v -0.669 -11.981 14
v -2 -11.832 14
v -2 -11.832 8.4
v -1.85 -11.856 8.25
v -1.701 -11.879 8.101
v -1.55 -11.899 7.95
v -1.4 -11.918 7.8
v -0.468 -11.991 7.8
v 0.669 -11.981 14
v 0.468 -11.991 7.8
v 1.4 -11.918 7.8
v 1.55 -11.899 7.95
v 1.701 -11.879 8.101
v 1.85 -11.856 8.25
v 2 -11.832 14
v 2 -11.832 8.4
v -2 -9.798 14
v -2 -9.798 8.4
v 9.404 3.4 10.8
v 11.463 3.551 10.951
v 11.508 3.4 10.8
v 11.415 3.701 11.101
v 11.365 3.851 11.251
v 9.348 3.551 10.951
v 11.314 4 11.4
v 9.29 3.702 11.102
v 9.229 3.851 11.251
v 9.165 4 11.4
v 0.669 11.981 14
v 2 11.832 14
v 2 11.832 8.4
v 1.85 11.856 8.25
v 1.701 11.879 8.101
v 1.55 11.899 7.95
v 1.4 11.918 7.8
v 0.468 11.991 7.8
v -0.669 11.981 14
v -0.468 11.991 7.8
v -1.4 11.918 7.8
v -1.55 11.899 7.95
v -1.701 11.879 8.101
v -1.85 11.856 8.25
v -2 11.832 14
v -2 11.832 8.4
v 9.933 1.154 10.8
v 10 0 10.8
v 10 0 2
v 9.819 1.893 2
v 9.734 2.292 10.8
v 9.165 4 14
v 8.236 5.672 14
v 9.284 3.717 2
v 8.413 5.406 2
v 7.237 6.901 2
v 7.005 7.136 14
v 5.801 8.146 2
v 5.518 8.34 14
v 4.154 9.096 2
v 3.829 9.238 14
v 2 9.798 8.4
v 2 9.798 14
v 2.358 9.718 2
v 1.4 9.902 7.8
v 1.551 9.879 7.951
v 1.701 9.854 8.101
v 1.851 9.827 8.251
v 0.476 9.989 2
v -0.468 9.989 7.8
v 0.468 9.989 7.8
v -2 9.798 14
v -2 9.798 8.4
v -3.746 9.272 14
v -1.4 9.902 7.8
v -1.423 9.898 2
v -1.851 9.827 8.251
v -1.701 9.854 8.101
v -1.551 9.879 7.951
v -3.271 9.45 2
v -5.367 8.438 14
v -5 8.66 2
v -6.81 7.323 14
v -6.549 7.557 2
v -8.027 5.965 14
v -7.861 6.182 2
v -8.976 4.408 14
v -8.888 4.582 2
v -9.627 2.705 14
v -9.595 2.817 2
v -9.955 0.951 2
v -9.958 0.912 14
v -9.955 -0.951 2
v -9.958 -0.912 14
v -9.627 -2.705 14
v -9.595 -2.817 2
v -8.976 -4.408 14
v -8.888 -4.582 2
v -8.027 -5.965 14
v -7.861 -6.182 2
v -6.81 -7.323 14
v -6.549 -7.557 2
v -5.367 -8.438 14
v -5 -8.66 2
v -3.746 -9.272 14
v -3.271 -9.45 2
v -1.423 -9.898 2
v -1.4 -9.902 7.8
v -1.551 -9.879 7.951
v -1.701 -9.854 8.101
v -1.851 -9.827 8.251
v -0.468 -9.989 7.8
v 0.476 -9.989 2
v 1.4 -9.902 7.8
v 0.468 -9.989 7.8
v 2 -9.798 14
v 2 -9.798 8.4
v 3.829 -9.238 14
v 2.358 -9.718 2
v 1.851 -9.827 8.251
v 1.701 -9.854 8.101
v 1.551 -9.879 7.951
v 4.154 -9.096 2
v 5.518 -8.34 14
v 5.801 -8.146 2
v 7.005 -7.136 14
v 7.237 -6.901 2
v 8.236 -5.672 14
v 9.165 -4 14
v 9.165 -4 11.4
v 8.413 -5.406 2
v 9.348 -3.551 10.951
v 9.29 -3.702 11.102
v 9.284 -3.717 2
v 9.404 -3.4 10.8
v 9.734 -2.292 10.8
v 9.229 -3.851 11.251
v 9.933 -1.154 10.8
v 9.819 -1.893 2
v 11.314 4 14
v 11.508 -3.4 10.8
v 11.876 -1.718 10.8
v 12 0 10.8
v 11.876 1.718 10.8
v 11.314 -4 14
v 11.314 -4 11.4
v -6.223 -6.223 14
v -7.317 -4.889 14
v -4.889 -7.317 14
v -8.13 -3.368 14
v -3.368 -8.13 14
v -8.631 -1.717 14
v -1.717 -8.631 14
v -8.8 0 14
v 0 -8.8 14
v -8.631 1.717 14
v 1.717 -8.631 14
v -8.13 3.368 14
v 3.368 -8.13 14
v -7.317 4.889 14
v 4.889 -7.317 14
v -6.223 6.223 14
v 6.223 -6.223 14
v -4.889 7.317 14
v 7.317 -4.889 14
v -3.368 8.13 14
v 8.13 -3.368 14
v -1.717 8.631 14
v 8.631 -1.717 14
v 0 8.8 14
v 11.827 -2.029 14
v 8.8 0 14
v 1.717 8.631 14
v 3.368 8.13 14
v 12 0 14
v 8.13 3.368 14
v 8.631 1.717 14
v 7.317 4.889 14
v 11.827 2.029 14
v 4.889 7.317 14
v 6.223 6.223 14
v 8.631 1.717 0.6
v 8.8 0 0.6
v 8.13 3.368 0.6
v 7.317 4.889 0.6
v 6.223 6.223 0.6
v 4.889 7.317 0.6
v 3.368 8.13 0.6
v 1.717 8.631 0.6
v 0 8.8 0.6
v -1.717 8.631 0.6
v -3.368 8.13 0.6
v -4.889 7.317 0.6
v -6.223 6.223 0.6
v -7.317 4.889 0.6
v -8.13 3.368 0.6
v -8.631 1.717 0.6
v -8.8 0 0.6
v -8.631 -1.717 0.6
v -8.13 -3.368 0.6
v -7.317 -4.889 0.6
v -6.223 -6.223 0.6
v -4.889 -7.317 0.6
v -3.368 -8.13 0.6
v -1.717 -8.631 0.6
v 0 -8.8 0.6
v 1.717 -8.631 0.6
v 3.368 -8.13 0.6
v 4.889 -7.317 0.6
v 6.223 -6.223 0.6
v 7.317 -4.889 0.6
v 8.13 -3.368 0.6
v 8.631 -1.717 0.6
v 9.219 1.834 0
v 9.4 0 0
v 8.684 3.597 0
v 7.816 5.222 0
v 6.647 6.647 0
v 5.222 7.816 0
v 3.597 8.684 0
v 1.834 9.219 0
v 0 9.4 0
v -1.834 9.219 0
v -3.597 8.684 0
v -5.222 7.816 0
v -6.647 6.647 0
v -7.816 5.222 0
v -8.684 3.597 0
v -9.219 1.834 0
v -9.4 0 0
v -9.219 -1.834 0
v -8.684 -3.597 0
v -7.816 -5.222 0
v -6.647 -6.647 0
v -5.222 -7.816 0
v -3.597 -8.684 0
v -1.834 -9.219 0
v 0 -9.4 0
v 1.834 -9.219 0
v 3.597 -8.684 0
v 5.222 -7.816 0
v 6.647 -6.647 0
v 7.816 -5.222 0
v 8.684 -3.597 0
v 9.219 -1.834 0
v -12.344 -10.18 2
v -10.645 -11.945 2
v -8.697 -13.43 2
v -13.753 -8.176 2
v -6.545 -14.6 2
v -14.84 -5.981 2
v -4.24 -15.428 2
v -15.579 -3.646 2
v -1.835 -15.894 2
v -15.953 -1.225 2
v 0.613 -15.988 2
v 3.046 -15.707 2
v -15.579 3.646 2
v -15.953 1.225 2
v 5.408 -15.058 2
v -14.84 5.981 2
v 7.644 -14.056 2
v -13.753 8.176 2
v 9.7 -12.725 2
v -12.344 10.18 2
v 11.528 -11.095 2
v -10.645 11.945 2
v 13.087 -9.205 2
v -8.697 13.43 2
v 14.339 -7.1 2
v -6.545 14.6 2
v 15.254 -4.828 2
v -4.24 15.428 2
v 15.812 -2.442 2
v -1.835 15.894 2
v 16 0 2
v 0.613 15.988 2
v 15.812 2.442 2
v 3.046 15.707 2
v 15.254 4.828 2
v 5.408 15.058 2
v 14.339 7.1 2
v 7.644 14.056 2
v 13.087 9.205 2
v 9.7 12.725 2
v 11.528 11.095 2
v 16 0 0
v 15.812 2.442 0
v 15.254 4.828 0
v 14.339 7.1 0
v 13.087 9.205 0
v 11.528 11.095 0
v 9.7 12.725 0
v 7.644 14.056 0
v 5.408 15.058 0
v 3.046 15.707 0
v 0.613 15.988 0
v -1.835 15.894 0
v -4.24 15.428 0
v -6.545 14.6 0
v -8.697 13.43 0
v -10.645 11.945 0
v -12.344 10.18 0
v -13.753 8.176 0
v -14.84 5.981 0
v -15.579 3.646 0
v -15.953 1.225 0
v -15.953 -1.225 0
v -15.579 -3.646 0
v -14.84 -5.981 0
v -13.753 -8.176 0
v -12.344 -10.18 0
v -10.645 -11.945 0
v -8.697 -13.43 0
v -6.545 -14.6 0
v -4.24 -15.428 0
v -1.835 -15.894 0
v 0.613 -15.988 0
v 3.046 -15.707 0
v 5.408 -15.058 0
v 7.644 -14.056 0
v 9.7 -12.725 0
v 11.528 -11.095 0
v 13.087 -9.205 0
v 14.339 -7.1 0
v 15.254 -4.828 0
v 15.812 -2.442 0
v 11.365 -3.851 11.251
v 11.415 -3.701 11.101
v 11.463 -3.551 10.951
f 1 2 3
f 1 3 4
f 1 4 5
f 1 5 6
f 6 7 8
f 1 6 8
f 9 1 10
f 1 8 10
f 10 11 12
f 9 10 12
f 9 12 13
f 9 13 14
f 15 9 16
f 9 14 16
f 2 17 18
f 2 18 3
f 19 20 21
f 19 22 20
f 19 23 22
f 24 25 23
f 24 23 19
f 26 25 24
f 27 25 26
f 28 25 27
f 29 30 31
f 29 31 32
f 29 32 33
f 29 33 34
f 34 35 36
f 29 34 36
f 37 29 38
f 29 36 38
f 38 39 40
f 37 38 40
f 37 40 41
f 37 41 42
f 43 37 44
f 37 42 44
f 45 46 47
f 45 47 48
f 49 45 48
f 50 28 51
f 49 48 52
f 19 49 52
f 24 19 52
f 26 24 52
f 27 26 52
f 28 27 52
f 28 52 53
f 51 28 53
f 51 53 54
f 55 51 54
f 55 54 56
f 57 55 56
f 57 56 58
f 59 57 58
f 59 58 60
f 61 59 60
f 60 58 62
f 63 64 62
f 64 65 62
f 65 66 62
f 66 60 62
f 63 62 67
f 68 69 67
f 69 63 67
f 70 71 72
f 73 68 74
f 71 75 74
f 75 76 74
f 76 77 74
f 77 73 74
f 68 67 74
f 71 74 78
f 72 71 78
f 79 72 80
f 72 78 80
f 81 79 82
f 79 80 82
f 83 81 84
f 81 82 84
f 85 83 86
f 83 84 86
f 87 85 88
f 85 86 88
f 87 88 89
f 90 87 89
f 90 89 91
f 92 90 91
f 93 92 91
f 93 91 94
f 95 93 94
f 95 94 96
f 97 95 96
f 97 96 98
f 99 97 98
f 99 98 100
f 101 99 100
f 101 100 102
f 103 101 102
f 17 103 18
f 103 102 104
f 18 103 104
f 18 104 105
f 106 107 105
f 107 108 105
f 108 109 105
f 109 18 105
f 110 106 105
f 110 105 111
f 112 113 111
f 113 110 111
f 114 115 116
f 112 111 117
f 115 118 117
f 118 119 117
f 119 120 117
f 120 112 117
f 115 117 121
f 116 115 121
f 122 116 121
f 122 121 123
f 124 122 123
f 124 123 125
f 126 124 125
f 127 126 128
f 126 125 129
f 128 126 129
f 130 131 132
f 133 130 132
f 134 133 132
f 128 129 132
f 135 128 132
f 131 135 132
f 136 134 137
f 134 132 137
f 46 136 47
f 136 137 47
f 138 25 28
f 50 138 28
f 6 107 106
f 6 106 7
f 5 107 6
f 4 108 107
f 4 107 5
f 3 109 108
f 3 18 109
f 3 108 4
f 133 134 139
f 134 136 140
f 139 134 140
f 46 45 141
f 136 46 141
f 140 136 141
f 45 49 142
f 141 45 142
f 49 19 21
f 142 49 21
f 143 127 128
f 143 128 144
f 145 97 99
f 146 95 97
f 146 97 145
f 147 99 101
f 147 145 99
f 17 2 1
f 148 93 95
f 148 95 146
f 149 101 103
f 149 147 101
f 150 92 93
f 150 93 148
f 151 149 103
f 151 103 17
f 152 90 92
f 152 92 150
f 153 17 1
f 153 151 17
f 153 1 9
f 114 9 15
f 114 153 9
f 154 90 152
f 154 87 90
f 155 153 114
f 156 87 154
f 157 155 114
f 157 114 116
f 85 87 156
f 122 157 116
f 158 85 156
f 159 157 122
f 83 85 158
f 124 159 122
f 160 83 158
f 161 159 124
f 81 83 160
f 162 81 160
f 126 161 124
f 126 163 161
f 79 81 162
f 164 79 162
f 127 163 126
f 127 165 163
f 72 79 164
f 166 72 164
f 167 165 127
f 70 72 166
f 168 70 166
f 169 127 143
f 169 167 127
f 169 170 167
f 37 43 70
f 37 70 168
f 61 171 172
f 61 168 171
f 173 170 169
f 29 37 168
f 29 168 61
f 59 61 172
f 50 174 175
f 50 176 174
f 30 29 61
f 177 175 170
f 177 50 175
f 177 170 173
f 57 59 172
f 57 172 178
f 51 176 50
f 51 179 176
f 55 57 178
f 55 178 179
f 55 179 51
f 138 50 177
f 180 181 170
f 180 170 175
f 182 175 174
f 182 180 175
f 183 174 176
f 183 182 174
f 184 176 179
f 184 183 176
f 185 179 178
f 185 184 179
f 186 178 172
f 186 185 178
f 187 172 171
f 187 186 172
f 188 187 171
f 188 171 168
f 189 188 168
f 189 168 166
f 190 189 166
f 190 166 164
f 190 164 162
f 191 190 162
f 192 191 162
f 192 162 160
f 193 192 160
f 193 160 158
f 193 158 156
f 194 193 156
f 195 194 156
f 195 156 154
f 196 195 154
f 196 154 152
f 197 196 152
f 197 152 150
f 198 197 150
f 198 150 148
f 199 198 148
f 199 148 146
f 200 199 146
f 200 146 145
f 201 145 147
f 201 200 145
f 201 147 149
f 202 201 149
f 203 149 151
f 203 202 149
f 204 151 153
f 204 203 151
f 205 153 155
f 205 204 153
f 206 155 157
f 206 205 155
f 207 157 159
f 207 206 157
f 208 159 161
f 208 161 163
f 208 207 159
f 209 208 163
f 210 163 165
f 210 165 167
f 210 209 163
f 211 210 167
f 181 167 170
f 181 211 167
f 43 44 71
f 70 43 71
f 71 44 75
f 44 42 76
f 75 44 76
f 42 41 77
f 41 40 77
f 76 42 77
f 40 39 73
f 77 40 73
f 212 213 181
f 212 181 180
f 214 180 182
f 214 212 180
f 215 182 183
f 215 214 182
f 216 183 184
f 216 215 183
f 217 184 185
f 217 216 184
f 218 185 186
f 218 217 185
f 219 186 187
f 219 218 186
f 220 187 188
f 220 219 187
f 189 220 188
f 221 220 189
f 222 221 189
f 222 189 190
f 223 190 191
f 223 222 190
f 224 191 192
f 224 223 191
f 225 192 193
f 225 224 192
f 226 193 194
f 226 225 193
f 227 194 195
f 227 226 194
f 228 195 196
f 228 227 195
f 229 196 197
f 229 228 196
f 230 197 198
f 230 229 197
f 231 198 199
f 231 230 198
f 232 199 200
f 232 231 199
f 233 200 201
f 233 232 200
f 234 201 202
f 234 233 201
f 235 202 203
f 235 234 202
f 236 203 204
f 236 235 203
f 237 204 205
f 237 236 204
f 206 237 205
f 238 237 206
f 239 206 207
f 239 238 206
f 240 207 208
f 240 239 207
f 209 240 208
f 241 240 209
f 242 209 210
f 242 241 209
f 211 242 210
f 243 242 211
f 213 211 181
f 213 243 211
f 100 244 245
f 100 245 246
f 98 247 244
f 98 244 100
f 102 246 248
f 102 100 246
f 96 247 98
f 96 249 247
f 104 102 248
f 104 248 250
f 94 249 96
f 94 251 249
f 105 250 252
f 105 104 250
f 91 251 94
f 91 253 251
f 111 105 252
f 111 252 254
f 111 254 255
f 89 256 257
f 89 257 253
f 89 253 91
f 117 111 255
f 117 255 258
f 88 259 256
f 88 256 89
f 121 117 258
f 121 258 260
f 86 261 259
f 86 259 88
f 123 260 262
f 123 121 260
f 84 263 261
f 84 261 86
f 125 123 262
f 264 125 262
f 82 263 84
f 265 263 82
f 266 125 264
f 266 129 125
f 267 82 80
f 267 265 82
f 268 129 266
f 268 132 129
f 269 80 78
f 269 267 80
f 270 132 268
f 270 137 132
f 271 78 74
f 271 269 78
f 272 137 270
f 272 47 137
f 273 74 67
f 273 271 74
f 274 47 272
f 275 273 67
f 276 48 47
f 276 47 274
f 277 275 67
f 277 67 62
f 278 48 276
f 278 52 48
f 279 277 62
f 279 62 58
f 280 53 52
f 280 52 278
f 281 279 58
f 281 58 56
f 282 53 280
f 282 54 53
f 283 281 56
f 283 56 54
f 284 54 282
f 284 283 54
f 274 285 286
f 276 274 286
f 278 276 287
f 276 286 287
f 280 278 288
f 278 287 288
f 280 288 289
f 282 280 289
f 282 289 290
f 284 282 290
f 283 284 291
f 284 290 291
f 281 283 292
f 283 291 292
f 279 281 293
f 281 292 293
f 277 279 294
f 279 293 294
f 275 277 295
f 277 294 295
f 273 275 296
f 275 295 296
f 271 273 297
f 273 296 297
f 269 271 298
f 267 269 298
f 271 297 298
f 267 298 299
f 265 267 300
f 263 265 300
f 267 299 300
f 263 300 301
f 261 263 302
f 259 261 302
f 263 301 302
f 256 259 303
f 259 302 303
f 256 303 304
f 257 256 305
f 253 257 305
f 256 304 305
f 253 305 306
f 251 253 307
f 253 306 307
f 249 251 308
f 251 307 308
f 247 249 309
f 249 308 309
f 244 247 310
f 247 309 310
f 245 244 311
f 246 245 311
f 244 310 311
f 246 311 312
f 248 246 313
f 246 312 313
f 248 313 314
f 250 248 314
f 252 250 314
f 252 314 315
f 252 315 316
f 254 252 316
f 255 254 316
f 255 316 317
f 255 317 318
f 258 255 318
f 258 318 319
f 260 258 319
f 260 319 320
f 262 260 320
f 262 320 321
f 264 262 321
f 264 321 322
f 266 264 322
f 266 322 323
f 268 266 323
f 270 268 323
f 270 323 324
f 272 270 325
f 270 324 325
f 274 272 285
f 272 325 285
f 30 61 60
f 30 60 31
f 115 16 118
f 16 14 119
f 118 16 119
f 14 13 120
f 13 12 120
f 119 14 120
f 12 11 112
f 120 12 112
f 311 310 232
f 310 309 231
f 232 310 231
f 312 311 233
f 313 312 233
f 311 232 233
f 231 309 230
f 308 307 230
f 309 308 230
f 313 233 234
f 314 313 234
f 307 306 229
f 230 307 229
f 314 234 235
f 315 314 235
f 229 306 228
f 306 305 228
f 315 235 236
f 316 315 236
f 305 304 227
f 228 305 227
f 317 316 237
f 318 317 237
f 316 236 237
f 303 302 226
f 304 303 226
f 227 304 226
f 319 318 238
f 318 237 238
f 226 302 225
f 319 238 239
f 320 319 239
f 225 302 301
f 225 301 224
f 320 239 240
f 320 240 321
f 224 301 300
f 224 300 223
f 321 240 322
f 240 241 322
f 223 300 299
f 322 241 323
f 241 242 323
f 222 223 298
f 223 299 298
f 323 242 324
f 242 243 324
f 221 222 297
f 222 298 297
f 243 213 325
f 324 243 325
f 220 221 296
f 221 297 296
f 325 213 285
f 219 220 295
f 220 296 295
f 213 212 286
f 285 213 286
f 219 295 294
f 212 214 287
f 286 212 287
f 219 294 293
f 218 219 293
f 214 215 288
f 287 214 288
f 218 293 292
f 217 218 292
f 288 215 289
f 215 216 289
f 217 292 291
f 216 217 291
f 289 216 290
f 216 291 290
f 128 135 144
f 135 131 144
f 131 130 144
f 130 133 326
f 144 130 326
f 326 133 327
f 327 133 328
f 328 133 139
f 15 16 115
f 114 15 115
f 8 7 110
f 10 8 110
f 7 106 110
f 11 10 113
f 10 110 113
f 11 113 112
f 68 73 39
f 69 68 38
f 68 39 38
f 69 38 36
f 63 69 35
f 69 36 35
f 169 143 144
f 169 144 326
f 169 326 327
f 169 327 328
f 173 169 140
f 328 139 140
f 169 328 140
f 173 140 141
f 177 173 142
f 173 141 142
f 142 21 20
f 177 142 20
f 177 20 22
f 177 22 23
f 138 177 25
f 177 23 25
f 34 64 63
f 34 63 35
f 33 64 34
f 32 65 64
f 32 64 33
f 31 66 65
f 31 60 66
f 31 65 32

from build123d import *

# Parameters (mm, degrees)
F0_R     = 16
F0_R_2   = 8.8
F1_DEPTH = 2
F2_R     = 10
F2_R_2   = 8.8
F3_DEPTH = 12
F6_DEPTH = 6.2
F9_DEPTH = 3.2
F10_SIZE = 0.6


with BuildPart() as f1:
    # F0 (on Top) → F1 (new body)
    with BuildSketch(Plane.XY):
        Circle(F0_R)
        Circle(F0_R_2, mode=Mode.SUBTRACT)
    extrude(amount=F1_DEPTH)

    # F2 (on face) → F3 (join)
    with BuildSketch(Plane.XY.offset(2)):
        Circle(F2_R)
        Circle(F2_R_2, mode=Mode.SUBTRACT)
    extrude(amount=F3_DEPTH)

    # F5 (on offset) → F6 (join, through all)
    with BuildSketch(Plane.XY.offset(7.8)):
        with BuildLine():
            Line((-2, -9.7979589711), (-2, -11.8321595662))
            ThreePointArc((-2, -11.8321595662), (0, -12), (2, -11.8321595662))
            Line((2, -11.8321595662), (2, -9.7979589711))
            ThreePointArc((2, -9.7979589711), (0, -10), (-2, -9.7979589711))
        make_face()
        with BuildLine():
            ThreePointArc((2, 11.8321595662), (0, 12), (-2, 11.8321595662))
            Line((-2, 11.8321595662), (-2, 9.7979589711))
            ThreePointArc((-2, 9.7979589711), (0, 10), (2, 9.7979589711))
            Line((2, 9.7979589711), (2, 11.8321595662))
        make_face()
    extrude(amount=F6_DEPTH)

    # F8 (on offset) → F9 (join, through all)
    with BuildSketch(Plane.XY.offset(10.8)):
        with BuildLine():
            ThreePointArc((9.1651513899, 4), (10, 0), (9.1651513899, -4))
            Line((9.1651513899, -4), (11.313708499, -4))
            ThreePointArc((11.313708499, -4), (12, 0), (11.313708499, 4))
            Line((11.313708499, 4), (9.1651513899, 4))
        make_face()
    extrude(amount=F9_DEPTH)

    # F10
    f10_edges = [f1.edges().sort_by_distance(p)[0] for p in [
        (-8.8, 0, 0),
        (-2, 10.815059, 7.8),
        (2, 10.815059, 7.8),
        (10.23943, 4, 10.8),
        (10.23943, -4, 10.8),
        (-2, -10.815059, 7.8),
        (2, -10.815059, 7.8),
    ]]
    chamfer(f10_edges, length=F10_SIZE)


solid = f1.part
